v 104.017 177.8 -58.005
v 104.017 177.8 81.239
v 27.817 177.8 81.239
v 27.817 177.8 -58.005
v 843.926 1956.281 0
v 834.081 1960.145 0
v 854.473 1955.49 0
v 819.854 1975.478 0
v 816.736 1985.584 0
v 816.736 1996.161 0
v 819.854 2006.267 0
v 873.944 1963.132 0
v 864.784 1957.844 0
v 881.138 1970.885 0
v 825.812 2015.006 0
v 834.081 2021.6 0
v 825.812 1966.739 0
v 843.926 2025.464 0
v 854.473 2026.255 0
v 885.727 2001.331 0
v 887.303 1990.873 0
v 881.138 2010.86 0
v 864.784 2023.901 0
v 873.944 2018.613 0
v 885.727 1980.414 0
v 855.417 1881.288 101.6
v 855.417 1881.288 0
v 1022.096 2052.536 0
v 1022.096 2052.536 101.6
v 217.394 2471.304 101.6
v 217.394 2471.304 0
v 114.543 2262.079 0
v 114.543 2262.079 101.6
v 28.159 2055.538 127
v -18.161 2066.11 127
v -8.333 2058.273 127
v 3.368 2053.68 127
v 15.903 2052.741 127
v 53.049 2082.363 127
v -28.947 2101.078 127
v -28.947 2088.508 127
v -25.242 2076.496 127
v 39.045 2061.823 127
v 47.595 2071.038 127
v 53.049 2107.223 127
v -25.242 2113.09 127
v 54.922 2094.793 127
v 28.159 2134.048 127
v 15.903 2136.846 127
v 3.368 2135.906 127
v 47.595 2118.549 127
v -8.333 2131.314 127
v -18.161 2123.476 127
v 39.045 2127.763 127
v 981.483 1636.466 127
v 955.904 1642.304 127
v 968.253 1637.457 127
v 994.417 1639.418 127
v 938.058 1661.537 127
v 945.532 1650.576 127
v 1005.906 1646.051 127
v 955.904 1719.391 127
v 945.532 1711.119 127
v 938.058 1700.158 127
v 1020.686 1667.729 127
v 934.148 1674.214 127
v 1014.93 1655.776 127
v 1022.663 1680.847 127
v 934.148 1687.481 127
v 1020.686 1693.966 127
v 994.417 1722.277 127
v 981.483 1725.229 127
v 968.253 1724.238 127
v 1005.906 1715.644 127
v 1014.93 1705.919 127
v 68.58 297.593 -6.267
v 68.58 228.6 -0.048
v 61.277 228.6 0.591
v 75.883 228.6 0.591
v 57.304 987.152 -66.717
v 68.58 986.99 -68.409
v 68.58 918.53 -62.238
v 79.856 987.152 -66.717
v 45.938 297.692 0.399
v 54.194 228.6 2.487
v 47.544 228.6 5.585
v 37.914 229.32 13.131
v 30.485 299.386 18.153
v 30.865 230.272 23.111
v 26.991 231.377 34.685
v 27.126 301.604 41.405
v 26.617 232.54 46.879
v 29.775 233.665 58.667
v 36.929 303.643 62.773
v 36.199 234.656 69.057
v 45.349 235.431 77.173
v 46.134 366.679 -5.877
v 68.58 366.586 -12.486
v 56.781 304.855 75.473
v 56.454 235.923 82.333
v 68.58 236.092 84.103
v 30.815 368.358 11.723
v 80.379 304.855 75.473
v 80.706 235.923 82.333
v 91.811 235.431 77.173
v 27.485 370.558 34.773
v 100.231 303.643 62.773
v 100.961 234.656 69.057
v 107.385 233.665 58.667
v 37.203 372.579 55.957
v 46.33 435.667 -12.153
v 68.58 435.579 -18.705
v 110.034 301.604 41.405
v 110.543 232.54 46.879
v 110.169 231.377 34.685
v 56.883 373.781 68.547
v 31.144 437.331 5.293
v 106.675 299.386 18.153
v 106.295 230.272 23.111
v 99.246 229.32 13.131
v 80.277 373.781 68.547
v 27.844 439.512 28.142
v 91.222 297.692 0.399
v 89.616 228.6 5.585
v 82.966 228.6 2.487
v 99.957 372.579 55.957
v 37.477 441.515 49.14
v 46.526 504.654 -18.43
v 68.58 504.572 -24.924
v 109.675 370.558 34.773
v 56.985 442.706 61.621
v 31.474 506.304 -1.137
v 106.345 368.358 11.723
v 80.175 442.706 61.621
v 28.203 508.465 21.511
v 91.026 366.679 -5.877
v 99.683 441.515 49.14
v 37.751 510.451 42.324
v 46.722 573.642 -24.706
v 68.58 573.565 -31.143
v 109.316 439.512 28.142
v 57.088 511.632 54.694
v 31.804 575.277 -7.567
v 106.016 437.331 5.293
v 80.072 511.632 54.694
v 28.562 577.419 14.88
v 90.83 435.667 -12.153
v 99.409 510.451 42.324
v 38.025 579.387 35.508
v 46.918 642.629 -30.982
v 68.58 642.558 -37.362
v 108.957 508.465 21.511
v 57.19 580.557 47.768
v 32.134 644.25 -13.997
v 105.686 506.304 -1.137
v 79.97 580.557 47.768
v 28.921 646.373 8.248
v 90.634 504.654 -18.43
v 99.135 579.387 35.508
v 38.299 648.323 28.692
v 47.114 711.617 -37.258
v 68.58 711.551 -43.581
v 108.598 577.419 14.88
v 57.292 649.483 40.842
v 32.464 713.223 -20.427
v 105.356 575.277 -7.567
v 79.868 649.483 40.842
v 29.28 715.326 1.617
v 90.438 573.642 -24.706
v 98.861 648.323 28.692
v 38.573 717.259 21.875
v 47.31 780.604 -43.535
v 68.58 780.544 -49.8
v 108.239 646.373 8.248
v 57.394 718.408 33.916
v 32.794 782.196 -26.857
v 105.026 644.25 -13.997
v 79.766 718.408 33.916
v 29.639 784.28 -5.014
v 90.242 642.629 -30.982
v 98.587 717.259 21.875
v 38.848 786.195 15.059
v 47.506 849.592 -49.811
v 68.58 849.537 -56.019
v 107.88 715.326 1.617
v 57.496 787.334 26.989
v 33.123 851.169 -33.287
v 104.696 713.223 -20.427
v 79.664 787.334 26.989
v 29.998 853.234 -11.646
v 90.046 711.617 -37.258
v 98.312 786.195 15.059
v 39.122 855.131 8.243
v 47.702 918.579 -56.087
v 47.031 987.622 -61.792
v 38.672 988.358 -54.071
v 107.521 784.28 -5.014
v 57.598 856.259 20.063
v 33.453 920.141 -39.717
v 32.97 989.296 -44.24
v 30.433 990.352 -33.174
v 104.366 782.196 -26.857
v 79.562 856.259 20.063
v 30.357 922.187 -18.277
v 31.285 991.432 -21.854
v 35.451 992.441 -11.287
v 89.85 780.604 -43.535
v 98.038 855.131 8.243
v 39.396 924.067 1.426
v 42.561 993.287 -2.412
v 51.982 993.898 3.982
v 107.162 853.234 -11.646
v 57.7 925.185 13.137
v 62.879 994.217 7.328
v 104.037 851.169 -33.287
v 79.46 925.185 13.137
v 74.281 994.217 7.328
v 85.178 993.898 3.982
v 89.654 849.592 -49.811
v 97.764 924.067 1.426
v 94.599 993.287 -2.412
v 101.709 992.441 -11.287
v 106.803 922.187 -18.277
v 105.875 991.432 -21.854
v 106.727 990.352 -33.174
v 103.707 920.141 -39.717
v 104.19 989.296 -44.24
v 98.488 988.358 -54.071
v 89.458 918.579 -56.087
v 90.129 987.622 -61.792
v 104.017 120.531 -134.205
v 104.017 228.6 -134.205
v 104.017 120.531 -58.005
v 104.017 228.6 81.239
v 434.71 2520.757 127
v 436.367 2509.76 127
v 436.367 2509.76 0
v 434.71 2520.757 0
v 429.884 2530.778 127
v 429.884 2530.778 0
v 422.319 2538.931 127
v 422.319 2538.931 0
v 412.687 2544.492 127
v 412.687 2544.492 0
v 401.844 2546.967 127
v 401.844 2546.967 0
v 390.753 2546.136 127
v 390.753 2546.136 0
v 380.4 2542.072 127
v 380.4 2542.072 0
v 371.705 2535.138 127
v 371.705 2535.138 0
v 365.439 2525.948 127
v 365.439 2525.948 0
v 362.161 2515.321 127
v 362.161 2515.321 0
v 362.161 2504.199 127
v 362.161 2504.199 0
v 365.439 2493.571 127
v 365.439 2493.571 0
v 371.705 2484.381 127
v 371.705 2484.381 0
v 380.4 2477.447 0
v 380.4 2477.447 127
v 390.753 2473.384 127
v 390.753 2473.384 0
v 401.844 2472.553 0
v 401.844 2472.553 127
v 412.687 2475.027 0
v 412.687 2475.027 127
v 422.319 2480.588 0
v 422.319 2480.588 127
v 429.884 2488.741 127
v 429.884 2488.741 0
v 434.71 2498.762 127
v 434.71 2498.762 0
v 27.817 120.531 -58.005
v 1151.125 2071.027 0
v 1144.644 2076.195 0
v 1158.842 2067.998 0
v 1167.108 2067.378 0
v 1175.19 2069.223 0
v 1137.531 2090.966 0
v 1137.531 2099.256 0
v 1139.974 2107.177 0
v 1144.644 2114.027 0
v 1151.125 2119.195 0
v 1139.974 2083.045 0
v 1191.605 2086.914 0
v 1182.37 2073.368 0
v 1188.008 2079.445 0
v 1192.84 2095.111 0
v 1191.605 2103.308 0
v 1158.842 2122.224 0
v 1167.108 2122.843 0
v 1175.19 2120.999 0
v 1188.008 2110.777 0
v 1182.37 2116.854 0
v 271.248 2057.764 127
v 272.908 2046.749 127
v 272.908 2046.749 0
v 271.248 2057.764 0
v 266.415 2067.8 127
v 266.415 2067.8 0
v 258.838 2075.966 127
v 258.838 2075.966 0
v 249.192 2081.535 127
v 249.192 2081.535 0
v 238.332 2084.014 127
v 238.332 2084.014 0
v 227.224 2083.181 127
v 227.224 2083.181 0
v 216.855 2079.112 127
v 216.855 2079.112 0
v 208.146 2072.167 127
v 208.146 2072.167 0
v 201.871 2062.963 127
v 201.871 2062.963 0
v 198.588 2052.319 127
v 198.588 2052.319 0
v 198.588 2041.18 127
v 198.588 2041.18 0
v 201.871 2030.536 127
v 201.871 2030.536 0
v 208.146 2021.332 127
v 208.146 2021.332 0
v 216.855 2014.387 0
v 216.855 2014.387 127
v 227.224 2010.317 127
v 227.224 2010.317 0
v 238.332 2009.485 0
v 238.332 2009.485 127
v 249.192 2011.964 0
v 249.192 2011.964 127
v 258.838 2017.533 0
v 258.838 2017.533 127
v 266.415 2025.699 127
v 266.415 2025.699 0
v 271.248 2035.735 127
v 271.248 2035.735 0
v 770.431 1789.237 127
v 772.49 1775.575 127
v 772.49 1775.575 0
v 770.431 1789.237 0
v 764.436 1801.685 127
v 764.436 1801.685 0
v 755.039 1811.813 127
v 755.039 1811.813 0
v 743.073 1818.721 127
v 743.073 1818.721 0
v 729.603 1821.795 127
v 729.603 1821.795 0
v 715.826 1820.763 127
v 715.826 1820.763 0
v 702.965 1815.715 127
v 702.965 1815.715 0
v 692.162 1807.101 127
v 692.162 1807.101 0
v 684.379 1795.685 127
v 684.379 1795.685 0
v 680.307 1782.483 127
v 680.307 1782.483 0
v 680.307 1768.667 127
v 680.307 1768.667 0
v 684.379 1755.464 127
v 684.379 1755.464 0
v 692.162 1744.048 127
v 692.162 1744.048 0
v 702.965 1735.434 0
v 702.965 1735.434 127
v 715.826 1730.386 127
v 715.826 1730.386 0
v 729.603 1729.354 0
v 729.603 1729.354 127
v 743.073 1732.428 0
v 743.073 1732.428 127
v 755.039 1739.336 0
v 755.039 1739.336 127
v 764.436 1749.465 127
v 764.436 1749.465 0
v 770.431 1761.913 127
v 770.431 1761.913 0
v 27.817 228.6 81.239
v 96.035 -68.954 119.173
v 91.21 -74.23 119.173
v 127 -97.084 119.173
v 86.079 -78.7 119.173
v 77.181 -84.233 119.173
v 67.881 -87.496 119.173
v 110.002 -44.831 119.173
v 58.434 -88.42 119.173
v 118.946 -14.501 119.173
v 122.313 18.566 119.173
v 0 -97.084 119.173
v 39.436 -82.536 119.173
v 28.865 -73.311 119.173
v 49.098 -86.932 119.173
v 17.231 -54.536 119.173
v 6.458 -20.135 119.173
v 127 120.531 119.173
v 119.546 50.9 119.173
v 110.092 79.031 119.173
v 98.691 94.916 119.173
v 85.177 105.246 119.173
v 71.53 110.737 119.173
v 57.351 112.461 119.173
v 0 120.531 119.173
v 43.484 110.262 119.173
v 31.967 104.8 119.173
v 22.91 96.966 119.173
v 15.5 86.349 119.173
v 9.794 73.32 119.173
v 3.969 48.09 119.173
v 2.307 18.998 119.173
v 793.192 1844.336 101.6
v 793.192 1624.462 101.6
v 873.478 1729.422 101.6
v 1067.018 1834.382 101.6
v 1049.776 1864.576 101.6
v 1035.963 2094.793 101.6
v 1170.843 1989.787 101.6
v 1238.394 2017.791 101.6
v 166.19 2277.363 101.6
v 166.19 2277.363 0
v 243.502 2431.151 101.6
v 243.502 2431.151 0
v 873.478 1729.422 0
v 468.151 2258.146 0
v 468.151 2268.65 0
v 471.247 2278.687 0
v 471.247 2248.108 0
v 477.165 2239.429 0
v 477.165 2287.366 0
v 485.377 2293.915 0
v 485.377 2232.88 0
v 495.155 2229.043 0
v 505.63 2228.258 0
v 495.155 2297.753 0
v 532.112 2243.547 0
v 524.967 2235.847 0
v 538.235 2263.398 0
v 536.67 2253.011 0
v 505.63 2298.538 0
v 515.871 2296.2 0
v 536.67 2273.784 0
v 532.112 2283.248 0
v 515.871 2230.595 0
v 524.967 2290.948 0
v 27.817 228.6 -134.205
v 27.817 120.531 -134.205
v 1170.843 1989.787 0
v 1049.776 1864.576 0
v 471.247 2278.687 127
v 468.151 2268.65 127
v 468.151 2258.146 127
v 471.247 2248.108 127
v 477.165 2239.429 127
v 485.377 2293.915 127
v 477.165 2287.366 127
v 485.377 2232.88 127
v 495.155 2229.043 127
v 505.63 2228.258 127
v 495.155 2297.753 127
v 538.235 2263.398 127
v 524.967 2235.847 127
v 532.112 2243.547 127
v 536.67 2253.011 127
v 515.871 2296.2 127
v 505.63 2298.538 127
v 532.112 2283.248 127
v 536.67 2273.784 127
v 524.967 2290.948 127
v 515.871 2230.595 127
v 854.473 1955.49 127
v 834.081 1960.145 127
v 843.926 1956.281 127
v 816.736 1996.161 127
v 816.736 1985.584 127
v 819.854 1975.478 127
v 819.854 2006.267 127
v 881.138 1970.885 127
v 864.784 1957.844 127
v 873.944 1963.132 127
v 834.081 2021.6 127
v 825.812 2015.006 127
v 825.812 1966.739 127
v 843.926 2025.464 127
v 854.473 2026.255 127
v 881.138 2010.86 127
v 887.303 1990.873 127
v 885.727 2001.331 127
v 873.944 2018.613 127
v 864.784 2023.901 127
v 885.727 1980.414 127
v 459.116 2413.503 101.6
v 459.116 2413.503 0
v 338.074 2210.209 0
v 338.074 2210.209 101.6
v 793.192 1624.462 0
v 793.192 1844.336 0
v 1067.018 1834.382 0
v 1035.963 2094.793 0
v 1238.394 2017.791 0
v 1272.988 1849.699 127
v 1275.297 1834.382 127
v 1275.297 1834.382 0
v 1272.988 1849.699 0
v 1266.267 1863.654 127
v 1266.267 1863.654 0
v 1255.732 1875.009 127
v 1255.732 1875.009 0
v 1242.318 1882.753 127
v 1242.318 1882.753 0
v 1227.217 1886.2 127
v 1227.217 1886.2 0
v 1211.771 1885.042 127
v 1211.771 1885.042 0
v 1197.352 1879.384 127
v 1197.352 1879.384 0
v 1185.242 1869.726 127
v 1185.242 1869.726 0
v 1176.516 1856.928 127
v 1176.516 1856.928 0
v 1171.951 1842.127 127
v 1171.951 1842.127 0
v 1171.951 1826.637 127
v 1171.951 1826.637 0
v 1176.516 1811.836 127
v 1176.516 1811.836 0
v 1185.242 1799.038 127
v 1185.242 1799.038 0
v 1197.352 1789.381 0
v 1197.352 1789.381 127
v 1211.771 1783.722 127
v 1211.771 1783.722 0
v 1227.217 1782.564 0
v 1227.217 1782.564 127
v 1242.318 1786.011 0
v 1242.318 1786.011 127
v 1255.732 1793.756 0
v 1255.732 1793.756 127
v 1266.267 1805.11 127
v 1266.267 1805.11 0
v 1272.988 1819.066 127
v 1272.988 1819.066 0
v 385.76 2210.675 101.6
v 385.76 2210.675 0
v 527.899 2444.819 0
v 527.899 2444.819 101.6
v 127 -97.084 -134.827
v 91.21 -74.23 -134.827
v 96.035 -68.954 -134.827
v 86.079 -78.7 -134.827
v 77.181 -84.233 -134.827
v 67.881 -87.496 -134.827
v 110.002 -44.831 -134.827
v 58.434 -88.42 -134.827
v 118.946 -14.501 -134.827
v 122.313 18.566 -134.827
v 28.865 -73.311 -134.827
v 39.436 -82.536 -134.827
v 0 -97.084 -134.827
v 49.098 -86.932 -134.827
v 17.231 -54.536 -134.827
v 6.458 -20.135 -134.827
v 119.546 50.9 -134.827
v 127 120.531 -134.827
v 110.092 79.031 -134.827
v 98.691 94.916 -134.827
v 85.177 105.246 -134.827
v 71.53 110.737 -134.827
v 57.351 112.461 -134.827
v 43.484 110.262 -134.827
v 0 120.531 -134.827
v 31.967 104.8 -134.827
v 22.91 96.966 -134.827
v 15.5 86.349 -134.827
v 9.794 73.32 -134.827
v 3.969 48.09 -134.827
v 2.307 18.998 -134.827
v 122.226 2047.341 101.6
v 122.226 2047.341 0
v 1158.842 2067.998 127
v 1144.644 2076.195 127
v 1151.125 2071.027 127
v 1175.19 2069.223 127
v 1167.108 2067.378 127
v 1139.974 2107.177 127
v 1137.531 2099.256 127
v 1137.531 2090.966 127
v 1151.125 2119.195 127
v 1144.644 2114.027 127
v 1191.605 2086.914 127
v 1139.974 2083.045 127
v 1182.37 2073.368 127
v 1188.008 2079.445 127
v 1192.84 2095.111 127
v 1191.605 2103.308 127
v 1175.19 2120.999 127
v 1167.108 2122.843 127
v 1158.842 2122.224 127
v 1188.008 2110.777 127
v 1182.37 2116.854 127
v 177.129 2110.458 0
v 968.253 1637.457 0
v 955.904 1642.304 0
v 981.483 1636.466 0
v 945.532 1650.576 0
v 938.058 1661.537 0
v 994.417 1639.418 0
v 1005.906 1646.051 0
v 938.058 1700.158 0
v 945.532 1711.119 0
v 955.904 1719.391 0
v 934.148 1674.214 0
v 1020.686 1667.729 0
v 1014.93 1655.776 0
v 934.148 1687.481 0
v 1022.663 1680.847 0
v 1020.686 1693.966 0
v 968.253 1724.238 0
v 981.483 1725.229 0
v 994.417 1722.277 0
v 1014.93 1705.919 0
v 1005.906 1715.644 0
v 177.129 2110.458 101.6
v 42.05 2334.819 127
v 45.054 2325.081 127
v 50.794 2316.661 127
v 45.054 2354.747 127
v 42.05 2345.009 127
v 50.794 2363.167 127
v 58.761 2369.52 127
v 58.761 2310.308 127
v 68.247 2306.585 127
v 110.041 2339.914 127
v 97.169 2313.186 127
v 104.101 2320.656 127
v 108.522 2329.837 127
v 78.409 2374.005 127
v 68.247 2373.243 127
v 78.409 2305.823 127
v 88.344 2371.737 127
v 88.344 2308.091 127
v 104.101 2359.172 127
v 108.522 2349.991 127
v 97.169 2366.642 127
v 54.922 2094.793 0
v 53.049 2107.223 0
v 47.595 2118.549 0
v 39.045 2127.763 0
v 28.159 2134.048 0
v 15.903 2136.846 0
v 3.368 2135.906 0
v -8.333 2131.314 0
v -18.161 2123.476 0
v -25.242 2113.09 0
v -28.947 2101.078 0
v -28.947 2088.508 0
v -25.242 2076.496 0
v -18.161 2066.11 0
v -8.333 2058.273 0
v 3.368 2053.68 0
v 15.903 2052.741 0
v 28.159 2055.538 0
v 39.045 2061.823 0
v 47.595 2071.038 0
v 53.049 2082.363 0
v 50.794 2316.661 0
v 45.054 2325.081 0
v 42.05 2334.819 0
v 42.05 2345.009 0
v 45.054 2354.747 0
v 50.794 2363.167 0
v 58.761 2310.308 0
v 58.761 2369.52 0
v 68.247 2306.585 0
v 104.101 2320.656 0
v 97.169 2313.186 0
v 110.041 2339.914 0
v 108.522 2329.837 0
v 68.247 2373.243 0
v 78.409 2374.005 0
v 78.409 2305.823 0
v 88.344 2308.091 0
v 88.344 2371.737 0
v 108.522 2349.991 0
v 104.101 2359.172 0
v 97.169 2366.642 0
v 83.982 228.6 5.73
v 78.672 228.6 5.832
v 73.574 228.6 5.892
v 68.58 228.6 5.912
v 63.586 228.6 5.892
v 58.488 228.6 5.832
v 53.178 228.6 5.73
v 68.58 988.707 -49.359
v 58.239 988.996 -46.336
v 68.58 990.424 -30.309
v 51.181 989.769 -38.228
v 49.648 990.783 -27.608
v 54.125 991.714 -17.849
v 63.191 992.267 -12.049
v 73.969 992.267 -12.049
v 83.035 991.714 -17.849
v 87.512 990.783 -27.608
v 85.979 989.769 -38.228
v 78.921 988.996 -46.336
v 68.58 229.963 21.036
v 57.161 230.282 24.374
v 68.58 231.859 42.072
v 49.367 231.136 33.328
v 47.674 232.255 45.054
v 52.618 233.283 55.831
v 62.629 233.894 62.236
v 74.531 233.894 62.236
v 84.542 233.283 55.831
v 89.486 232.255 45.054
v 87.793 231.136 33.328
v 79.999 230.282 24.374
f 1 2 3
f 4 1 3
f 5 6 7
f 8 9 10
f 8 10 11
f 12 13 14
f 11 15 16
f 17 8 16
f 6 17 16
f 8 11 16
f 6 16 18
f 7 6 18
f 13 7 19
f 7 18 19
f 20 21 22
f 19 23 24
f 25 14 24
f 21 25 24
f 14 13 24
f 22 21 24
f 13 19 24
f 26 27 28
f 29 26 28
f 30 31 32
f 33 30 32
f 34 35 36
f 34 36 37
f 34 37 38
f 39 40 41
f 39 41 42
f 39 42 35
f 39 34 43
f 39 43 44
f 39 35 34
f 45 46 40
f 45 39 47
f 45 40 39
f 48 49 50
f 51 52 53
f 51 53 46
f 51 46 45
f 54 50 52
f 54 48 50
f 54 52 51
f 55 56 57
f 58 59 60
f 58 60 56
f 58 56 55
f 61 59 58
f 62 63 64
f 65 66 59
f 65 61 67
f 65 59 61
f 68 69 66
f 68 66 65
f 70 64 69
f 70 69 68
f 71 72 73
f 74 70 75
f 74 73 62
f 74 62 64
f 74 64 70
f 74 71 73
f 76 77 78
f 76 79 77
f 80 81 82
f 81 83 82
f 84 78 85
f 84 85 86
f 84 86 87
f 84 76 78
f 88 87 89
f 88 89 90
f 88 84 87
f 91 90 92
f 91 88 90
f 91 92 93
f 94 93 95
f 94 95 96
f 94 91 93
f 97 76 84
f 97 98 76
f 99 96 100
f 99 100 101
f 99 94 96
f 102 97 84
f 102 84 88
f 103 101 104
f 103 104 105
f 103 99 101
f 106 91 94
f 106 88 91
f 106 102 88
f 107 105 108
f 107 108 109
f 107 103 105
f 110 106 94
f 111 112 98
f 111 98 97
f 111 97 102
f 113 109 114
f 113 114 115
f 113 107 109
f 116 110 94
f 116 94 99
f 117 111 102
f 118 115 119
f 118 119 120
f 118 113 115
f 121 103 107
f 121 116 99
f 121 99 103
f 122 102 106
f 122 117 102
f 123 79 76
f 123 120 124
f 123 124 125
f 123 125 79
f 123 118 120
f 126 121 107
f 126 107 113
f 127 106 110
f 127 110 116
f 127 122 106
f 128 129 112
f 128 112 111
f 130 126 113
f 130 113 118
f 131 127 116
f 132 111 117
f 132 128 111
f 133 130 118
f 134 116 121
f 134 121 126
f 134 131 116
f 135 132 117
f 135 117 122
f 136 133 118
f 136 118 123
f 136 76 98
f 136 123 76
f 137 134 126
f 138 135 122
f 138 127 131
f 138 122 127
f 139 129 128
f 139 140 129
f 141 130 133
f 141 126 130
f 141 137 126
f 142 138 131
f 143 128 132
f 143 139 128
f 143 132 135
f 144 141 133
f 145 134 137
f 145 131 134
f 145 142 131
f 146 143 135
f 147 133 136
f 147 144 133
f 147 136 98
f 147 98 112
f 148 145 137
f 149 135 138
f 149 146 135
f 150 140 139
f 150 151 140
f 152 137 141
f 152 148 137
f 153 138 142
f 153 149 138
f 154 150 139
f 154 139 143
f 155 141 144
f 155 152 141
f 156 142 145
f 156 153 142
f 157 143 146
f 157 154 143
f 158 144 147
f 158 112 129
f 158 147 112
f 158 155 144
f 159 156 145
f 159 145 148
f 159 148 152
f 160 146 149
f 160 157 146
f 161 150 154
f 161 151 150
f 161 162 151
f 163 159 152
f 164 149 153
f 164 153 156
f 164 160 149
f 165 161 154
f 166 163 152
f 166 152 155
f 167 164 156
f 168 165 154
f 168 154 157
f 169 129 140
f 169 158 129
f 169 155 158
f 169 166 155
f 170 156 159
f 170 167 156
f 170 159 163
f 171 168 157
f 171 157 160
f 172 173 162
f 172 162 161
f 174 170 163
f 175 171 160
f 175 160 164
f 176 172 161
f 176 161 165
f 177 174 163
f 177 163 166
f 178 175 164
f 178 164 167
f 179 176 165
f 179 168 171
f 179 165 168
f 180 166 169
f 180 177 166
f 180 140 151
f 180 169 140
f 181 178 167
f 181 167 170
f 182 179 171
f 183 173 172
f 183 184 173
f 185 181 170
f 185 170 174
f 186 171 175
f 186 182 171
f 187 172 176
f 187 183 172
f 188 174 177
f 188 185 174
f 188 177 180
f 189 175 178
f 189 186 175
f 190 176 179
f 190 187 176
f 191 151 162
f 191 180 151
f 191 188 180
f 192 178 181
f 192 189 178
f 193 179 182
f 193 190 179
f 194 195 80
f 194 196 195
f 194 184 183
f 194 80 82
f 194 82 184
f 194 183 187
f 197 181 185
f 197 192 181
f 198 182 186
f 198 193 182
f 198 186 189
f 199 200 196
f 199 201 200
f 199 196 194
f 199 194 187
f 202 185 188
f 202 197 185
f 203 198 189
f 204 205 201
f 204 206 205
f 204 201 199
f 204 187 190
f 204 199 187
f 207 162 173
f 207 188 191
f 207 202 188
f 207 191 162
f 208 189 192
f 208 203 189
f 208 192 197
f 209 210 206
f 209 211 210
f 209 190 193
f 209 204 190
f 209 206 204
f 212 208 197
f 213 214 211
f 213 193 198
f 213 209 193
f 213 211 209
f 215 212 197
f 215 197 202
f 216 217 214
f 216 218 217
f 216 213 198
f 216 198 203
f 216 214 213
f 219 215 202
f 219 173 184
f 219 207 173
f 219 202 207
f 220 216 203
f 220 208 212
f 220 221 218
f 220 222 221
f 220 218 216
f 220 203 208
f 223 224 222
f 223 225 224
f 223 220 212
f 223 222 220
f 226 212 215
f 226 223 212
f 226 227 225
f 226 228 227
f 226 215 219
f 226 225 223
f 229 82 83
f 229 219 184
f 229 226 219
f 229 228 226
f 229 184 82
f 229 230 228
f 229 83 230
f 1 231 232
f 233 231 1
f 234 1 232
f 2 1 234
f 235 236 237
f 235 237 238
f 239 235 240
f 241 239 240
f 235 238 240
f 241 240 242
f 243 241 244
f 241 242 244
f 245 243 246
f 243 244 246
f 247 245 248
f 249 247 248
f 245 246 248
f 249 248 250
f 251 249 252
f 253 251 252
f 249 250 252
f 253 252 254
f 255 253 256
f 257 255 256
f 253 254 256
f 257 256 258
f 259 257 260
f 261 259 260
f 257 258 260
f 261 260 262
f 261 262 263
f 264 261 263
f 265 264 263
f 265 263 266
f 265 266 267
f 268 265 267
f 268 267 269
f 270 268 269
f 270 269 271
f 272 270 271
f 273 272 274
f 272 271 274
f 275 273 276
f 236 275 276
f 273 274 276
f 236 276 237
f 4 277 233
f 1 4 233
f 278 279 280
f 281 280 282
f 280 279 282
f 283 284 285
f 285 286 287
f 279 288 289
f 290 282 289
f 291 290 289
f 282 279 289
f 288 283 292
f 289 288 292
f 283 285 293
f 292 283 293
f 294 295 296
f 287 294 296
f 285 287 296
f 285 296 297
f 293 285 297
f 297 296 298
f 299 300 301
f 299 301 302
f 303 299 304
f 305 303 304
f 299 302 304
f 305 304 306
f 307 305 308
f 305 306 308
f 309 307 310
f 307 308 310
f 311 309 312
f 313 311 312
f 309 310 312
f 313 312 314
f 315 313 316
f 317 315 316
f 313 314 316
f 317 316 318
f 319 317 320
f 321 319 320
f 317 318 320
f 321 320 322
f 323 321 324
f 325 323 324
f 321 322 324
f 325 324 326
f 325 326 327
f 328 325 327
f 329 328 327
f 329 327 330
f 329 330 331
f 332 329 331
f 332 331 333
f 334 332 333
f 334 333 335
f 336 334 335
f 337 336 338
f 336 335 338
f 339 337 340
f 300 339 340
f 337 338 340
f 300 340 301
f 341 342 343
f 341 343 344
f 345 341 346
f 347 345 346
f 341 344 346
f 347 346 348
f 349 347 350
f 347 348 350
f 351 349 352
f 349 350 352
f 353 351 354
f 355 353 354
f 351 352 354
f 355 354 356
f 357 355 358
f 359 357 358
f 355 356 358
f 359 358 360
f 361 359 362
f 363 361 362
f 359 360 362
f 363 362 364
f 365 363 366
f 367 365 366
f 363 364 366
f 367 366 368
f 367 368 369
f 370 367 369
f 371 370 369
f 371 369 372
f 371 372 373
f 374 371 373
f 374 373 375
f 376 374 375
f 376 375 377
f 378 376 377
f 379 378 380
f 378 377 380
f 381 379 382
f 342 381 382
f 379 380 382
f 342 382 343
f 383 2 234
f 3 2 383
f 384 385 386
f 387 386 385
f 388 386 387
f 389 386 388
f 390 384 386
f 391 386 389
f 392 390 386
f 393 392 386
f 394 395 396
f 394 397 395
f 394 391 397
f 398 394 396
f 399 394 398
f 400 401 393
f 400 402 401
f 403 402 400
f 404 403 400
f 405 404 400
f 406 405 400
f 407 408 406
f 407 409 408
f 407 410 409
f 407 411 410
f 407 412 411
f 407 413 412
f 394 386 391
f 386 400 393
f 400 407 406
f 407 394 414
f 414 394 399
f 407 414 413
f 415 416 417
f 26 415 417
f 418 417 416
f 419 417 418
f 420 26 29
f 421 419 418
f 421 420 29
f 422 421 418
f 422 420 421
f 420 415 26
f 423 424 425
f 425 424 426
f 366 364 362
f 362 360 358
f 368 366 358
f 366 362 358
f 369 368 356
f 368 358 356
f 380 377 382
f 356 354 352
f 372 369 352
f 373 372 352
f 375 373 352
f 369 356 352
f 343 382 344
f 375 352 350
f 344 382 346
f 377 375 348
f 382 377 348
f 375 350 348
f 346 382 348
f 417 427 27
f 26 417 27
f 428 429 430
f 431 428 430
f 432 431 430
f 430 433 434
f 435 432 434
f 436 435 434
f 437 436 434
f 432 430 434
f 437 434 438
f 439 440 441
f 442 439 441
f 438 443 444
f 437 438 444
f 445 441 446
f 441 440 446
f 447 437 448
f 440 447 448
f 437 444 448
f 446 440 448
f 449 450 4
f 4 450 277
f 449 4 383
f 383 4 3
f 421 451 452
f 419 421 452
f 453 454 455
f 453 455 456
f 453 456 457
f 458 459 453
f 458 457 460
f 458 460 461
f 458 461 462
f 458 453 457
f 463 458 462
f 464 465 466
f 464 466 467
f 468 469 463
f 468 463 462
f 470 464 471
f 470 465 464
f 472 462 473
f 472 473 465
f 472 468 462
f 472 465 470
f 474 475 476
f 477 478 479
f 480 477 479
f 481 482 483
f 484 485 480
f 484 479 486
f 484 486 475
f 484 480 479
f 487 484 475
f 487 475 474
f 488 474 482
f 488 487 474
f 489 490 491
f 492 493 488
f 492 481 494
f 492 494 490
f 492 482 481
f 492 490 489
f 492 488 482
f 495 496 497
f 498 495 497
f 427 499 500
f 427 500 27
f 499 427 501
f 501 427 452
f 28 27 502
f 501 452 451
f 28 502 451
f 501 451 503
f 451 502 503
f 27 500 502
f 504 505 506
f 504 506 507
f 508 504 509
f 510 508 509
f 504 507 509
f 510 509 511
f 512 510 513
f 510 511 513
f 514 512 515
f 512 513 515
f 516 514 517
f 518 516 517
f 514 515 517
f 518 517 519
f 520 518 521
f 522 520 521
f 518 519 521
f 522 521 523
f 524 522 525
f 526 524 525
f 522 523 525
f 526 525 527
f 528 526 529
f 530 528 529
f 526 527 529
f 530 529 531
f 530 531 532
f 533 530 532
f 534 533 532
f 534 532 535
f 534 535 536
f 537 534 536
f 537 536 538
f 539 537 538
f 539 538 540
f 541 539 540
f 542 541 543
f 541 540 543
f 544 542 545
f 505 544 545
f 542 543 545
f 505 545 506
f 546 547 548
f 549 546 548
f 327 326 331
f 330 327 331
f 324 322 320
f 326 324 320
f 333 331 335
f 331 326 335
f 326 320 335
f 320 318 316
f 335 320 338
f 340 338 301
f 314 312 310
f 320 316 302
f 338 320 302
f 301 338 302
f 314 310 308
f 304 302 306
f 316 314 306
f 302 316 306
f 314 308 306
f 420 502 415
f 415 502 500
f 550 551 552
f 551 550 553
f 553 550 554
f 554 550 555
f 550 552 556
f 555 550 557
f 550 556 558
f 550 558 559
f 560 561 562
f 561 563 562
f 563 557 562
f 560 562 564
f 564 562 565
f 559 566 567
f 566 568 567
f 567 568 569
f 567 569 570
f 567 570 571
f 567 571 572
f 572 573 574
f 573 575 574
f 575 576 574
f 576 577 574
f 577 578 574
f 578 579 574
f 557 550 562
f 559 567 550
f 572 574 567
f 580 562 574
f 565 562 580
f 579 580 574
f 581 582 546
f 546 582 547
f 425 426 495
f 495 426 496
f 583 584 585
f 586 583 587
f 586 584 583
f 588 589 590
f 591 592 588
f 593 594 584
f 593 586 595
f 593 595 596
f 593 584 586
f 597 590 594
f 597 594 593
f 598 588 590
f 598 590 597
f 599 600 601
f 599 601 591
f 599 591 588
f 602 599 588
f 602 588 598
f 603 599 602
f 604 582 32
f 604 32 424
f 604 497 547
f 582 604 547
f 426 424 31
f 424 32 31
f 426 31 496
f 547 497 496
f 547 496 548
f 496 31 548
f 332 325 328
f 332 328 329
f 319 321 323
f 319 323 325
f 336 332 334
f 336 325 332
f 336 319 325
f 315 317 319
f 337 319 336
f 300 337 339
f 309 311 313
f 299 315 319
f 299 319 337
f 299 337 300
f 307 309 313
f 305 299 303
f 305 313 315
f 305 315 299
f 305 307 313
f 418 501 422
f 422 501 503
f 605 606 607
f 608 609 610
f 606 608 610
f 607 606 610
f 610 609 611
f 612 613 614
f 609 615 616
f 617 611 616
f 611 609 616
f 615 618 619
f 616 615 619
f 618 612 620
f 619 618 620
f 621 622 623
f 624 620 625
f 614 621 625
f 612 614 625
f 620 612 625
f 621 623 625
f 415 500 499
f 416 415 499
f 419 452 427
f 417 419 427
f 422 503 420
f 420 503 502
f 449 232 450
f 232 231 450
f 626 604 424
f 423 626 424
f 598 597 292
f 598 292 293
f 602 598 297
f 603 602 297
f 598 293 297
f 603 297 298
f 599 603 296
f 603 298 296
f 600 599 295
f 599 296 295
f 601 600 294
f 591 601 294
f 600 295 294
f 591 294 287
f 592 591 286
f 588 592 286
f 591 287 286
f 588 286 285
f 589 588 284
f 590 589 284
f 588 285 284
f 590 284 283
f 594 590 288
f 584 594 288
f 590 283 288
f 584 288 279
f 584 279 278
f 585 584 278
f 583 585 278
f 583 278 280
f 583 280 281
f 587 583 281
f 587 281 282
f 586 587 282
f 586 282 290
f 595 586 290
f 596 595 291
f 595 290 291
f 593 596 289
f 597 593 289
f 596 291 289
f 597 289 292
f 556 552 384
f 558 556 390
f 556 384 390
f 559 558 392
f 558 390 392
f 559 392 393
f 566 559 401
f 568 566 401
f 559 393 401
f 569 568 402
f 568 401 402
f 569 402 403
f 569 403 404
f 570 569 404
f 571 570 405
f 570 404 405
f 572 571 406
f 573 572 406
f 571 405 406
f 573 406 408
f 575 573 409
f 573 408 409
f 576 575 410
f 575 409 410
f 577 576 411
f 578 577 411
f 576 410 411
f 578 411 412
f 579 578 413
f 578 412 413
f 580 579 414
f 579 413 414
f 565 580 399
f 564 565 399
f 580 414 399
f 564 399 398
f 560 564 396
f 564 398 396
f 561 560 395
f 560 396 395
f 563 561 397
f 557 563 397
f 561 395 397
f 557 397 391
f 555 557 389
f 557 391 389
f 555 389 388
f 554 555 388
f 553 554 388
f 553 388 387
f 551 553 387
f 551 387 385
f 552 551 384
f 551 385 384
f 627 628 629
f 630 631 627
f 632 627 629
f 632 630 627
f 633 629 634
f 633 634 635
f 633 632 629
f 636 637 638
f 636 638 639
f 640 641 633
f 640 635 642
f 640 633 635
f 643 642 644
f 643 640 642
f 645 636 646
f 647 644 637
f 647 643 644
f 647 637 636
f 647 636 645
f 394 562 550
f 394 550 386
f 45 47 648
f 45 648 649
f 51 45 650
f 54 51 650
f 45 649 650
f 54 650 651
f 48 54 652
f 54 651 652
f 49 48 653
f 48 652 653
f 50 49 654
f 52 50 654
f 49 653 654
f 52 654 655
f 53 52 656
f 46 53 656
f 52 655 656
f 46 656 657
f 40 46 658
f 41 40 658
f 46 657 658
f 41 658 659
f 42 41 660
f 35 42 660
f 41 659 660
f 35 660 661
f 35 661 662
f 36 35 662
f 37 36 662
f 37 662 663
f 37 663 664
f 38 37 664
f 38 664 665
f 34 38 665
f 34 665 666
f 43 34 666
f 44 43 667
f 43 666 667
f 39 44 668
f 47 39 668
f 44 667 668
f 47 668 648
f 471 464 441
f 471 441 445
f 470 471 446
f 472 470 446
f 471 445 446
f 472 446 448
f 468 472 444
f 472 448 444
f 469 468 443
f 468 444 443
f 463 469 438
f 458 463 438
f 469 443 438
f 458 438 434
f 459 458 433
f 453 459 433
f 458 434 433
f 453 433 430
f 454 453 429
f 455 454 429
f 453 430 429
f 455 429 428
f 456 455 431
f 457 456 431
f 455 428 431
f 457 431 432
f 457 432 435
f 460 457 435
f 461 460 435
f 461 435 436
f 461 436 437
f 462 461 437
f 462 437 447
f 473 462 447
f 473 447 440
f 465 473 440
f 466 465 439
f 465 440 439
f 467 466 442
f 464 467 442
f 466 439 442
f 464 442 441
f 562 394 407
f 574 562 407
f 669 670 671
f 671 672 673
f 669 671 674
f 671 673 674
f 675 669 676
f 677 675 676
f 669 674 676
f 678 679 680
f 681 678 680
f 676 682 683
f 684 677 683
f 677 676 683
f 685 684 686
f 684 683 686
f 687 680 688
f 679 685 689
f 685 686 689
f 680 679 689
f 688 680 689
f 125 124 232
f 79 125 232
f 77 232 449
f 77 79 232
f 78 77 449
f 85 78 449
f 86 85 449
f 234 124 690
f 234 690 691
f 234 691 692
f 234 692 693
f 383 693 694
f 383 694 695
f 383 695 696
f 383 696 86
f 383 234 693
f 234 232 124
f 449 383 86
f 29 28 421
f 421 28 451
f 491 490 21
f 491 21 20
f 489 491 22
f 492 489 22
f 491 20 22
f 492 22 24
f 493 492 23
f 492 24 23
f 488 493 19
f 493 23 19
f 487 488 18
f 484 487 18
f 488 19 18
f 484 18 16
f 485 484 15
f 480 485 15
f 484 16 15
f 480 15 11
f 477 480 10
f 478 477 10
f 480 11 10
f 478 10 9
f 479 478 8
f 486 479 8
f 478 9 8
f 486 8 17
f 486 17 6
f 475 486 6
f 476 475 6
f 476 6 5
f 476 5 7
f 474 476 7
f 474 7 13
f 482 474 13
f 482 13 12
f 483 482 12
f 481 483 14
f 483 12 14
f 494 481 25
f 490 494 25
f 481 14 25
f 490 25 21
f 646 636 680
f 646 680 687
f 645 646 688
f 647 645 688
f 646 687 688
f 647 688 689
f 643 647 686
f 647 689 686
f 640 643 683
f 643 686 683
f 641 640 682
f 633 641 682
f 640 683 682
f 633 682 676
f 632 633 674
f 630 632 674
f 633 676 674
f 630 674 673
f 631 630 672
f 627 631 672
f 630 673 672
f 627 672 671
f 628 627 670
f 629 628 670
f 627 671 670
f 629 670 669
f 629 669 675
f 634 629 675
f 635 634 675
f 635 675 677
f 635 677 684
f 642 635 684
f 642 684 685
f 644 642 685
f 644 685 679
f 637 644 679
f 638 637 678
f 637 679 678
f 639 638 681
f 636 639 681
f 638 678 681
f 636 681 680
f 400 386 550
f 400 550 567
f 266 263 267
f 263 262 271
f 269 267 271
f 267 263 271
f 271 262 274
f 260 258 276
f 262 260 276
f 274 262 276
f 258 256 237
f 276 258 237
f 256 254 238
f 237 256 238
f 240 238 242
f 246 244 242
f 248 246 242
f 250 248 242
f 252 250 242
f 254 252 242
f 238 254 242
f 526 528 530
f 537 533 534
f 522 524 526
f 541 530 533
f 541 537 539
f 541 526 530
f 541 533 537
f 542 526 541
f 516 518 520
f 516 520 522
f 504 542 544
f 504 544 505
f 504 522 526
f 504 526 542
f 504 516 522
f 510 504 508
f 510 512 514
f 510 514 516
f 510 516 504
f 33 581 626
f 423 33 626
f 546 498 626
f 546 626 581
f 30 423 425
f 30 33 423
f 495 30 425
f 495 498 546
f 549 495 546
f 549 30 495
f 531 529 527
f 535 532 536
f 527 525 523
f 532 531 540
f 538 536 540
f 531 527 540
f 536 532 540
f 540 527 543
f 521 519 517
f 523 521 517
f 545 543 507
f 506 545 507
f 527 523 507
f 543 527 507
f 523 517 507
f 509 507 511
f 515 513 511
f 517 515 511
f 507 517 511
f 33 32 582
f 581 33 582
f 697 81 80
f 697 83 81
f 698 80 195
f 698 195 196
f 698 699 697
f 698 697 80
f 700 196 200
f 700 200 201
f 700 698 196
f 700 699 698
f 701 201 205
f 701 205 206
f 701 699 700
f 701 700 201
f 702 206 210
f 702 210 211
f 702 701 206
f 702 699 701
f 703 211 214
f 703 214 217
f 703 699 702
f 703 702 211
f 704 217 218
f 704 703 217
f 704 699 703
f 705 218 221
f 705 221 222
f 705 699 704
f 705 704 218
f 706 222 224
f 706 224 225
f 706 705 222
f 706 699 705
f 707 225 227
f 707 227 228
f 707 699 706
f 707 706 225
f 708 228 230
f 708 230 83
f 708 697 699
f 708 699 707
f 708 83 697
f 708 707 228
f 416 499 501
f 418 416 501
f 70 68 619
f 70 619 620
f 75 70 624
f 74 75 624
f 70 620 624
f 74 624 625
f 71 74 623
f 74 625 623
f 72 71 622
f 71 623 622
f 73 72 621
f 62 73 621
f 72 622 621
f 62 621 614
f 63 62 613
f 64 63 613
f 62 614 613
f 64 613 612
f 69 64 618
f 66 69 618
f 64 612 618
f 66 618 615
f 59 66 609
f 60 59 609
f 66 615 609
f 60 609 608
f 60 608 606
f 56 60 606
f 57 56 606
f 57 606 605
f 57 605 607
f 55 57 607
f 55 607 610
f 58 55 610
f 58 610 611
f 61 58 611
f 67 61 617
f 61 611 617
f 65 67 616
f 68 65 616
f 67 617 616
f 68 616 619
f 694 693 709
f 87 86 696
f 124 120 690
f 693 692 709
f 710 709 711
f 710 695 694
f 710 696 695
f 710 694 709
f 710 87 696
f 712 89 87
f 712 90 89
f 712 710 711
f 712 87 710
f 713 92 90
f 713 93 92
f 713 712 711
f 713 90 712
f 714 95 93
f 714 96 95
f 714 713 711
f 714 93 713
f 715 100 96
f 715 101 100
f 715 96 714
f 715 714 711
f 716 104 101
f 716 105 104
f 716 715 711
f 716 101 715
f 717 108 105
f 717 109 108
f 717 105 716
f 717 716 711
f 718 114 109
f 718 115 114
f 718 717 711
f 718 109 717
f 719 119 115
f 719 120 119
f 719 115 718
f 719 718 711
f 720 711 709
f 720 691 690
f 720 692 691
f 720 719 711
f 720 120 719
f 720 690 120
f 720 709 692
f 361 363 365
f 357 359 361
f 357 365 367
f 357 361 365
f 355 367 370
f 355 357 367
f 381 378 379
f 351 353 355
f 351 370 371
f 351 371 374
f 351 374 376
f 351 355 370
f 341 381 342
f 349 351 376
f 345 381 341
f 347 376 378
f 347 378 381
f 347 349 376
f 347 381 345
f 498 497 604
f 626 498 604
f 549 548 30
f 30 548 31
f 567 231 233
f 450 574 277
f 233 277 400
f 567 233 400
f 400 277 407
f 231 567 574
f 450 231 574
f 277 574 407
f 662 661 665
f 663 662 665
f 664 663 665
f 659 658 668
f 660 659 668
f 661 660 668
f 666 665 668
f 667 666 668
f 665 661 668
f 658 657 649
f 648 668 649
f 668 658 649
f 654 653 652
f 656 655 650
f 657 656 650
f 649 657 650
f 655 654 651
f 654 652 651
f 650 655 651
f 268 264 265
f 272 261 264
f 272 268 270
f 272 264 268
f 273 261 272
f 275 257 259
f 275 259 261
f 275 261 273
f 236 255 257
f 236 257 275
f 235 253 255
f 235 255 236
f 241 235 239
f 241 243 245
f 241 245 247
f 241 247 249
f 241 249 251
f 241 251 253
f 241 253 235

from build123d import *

# Parameters (mm, degrees)
F0_W      = 217.614380403
F0_H      = 254
F1_DEPTH  = 127
F2_W      = 76.2
F2_H      = 76.2
F3_DEPTH  = 177.8
F4_W      = 76.2
F4_H      = 215.4445648193
F5_DEPTH  = 50.8
F10_DEPTH = 254
F12_DEPTH = 127
F11_R     = 44.5061517934
F11_R_2   = 51.9630985592
F11_R_3   = 27.8101789548
F11_R_4   = 35.481424756
F11_R_5   = 46.3503959329
F11_R_6   = 37.3688939791
F11_R_7   = 35.2386836253
F11_R_8   = 37.3114185213
F11_R_9   = 34.1863192839
F11_R_10  = 42.1702188175
F13_DEPTH = 25.4


with BuildPart() as f1:
    # F0 (on Right) → F1 (new body)
    with BuildSketch(Plane.YZ):
        with Locations((11.7235407233, -7.8269019723)):
            Rectangle(F0_W, F0_H)
    extrude(amount=F1_DEPTH)

    # F2 (on Front) → F3 (join)
    with BuildSketch(Plane.XZ):
        with Locations((65.9171384811, -96.1052668333)):
            Rectangle(F2_W, F2_H)
    extrude(amount=-F3_DEPTH)

    # F4 (on face) → F5 (join)
    with BuildSketch(Plane(origin=(0, 177.8, 0), x_dir=(-1, 0, 0), z_dir=(0, 1, 0))):
        with Locations((-65.9171384811, -26.4829844236)):
            Rectangle(F4_W, F4_H)
    extrude(amount=F5_DEPTH)

    # F7 (on offset) → F8 (revolve)
    with BuildSketch(Plane.YZ.offset(68.58)):
        Polygon((990.4244733008, -30.3086977656), (231.8594604731, 42.0724451542), (228.0670851469, 0), (986.9901708875, -68.4086977656), align=None)
    revolve(axis=Axis((68.58, 611.1419668869, 5.8818736943), (0, 0.9954785058, -0.0949870753)))

    # F9 (on face) → F10 (cut, through all)
    with BuildSketch(Plane.XY.offset(119.1730980277)):
        with BuildLine():
            add(Edge.make_bspline(
                [(96.0349664092, -68.954333663), (125.4143850484, -33.1367367442), (138.4959831494, 109.9242702785), (-13.9157927457, 128.0873460879), (3.2878757636, -100.8582148726), (76.8940503244, -92.2897721685), (96.0349664092, -68.954333663)],
                knots=[0, 0, 0, 0, 0.2930288782, 0.5050224519, 0.8090894433, 1, 1, 1, 1], degree=3))
        make_face()
    extrude(amount=-F10_DEPTH, mode=Mode.SUBTRACT)


with BuildPart() as f12:
    # F11 (on Top) → F12 (new body)
    with BuildSketch(Plane.XY):
        Polygon((793.1918501854, 1844.3355725185), (793.1918501854, 1624.4624853134), (1067.018032074, 1834.3821763992), (1238.39366436, 2017.7907943726), (1035.9629392624, 2094.7933197021), align=None)
        Polygon((1049.7760996806, 1864.5756627621), (873.4776273751, 1729.4223308563), (855.417072773, 1881.2882900238), (1022.0957994461, 2052.5364875793), (1170.8430051804, 1989.7872209549), align=None, mode=Mode.SUBTRACT)
    extrude(amount=F12_DEPTH)


with BuildPart() as f12b:
    # F11 (on Top) → F12, piece 2 (new body)
    with BuildSketch(Plane.XY):
        Polygon((114.5428512245, 2262.0791196823), (122.2256664187, 2047.340631485), (385.7600558549, 2210.6747627258), (527.8993640095, 2444.818854332), (217.3940036446, 2471.3039398193), align=None)
        Polygon((338.0743651785, 2210.2088762584), (177.128970623, 2110.4576587677), (166.1901623011, 2277.3625850677), (243.5020208359, 2431.1511516571), (459.1158628464, 2413.5031700134), align=None, mode=Mode.SUBTRACT)
    extrude(amount=F12_DEPTH)


with BuildPart() as f12c:
    # F11 (on Top) → F12, piece 3 (new body)
    with BuildSketch(Plane.XY):
        with Locations((978.1569242477, 1680.8474063873)):
            Circle(F11_R)
    extrude(amount=F12_DEPTH)


with BuildPart() as f12d:
    # F11 (on Top) → F12, piece 4 (new body)
    with BuildSketch(Plane.XY):
        with Locations((1223.3334779739, 1834.3821763992)):
            Circle(F11_R_2)
    extrude(amount=F12_DEPTH)


with BuildPart() as f12e:
    # F11 (on Top) → F12, piece 5 (new body)
    with BuildSketch(Plane.XY):
        with Locations((1165.0302410126, 2095.1108932495)):
            Circle(F11_R_3)
    extrude(amount=F12_DEPTH)


with BuildPart() as f12f:
    # F11 (on Top) → F12, piece 6 (new body)
    with BuildSketch(Plane.XY):
        with Locations((851.8214225769, 1990.8726215363)):
            Circle(F11_R_4)
    extrude(amount=F12_DEPTH)


with BuildPart() as f12g:
    # F11 (on Top) → F12, piece 7 (new body)
    with BuildSketch(Plane.XY):
        with Locations((726.1397242546, 1775.5746841431)):
            Circle(F11_R_5)
    extrude(amount=F12_DEPTH)


with BuildPart() as f12h:
    # F11 (on Top) → F12, piece 8 (new body)
    with BuildSketch(Plane.XY):
        with Locations((235.5391383171, 2046.7493534088)):
            Circle(F11_R_6)
    extrude(amount=F12_DEPTH)


with BuildPart() as f12i:
    # F11 (on Top) → F12, piece 9 (new body)
    with BuildSketch(Plane.XY):
        with Locations((502.9964447021, 2263.397693634)):
            Circle(F11_R_7)
    extrude(amount=F12_DEPTH)


with BuildPart() as f12j:
    # F11 (on Top) → F12, piece 10 (new body)
    with BuildSketch(Plane.XY):
        with Locations((399.0558385849, 2509.7596645355)):
            Circle(F11_R_8)
    extrude(amount=F12_DEPTH)


with BuildPart() as f12k:
    # F11 (on Top) → F12, piece 11 (new body)
    with BuildSketch(Plane.XY):
        with Locations((75.8546367288, 2339.9140834808)):
            Circle(F11_R_9)
    extrude(amount=F12_DEPTH)


with BuildPart() as f12l:
    # F11 (on Top) → F12, piece 12 (new body)
    with BuildSketch(Plane.XY):
        with Locations((12.7520384267, 2094.7933197021)):
            Circle(F11_R_10)
    extrude(amount=F12_DEPTH)


with BuildPart() as f13_tool:
    # F12_face (on face) → F13 (new body)
    with BuildSketch(Plane(origin=(969.1354568342, 1867.9586759771, 127), x_dir=(1, 0, 0), z_dir=(0, 0, 1))):
        Polygon((97.8825752397, -33.5764995779), (269.2582075258, 149.8321183954), (66.8274824282, 226.834643725), (-175.9436066488, -23.6231034586), (-175.9436066488, -243.4961906637), align=None)
        Polygon((52.9603426119, 184.5778116022), (201.7075483461, 121.8285449778), (80.6406428464, -3.3830132151), (-95.6578294591, -138.5363451208), (-113.7183840612, 13.3296140467), align=None, mode=Mode.SUBTRACT)
        Polygon((-751.7414531896, 603.3452638422), (-854.5926056097, 394.1204437052), (-846.9097904156, 179.3819555079), (-583.3754009793, 342.7160867487), (-441.2360928247, 576.8601783548), align=None)
        Polygon((-725.6334359984, 563.19247568), (-510.0195939879, 545.5444940363), (-631.0610916557, 342.2502002813), (-792.0064862112, 242.4989827906), (-802.9452945332, 409.4039090906), align=None, mode=Mode.SUBTRACT)
    extrude(amount=-F13_DEPTH)


with BuildPart() as f12_1:
    add(f12.part)

    # F13: cut by f13_tool
    add(f13_tool.part, mode=Mode.SUBTRACT)


with BuildPart() as f12b_1:
    add(f12b.part)

    # F13: cut by f13_tool
    add(f13_tool.part, mode=Mode.SUBTRACT)


solid = Compound([f1.part, f12c.part, f12d.part, f12e.part, f12f.part, f12g.part, f12h.part, f12i.part, f12j.part, f12k.part, f12l.part, f12_1.part, f12b_1.part])
